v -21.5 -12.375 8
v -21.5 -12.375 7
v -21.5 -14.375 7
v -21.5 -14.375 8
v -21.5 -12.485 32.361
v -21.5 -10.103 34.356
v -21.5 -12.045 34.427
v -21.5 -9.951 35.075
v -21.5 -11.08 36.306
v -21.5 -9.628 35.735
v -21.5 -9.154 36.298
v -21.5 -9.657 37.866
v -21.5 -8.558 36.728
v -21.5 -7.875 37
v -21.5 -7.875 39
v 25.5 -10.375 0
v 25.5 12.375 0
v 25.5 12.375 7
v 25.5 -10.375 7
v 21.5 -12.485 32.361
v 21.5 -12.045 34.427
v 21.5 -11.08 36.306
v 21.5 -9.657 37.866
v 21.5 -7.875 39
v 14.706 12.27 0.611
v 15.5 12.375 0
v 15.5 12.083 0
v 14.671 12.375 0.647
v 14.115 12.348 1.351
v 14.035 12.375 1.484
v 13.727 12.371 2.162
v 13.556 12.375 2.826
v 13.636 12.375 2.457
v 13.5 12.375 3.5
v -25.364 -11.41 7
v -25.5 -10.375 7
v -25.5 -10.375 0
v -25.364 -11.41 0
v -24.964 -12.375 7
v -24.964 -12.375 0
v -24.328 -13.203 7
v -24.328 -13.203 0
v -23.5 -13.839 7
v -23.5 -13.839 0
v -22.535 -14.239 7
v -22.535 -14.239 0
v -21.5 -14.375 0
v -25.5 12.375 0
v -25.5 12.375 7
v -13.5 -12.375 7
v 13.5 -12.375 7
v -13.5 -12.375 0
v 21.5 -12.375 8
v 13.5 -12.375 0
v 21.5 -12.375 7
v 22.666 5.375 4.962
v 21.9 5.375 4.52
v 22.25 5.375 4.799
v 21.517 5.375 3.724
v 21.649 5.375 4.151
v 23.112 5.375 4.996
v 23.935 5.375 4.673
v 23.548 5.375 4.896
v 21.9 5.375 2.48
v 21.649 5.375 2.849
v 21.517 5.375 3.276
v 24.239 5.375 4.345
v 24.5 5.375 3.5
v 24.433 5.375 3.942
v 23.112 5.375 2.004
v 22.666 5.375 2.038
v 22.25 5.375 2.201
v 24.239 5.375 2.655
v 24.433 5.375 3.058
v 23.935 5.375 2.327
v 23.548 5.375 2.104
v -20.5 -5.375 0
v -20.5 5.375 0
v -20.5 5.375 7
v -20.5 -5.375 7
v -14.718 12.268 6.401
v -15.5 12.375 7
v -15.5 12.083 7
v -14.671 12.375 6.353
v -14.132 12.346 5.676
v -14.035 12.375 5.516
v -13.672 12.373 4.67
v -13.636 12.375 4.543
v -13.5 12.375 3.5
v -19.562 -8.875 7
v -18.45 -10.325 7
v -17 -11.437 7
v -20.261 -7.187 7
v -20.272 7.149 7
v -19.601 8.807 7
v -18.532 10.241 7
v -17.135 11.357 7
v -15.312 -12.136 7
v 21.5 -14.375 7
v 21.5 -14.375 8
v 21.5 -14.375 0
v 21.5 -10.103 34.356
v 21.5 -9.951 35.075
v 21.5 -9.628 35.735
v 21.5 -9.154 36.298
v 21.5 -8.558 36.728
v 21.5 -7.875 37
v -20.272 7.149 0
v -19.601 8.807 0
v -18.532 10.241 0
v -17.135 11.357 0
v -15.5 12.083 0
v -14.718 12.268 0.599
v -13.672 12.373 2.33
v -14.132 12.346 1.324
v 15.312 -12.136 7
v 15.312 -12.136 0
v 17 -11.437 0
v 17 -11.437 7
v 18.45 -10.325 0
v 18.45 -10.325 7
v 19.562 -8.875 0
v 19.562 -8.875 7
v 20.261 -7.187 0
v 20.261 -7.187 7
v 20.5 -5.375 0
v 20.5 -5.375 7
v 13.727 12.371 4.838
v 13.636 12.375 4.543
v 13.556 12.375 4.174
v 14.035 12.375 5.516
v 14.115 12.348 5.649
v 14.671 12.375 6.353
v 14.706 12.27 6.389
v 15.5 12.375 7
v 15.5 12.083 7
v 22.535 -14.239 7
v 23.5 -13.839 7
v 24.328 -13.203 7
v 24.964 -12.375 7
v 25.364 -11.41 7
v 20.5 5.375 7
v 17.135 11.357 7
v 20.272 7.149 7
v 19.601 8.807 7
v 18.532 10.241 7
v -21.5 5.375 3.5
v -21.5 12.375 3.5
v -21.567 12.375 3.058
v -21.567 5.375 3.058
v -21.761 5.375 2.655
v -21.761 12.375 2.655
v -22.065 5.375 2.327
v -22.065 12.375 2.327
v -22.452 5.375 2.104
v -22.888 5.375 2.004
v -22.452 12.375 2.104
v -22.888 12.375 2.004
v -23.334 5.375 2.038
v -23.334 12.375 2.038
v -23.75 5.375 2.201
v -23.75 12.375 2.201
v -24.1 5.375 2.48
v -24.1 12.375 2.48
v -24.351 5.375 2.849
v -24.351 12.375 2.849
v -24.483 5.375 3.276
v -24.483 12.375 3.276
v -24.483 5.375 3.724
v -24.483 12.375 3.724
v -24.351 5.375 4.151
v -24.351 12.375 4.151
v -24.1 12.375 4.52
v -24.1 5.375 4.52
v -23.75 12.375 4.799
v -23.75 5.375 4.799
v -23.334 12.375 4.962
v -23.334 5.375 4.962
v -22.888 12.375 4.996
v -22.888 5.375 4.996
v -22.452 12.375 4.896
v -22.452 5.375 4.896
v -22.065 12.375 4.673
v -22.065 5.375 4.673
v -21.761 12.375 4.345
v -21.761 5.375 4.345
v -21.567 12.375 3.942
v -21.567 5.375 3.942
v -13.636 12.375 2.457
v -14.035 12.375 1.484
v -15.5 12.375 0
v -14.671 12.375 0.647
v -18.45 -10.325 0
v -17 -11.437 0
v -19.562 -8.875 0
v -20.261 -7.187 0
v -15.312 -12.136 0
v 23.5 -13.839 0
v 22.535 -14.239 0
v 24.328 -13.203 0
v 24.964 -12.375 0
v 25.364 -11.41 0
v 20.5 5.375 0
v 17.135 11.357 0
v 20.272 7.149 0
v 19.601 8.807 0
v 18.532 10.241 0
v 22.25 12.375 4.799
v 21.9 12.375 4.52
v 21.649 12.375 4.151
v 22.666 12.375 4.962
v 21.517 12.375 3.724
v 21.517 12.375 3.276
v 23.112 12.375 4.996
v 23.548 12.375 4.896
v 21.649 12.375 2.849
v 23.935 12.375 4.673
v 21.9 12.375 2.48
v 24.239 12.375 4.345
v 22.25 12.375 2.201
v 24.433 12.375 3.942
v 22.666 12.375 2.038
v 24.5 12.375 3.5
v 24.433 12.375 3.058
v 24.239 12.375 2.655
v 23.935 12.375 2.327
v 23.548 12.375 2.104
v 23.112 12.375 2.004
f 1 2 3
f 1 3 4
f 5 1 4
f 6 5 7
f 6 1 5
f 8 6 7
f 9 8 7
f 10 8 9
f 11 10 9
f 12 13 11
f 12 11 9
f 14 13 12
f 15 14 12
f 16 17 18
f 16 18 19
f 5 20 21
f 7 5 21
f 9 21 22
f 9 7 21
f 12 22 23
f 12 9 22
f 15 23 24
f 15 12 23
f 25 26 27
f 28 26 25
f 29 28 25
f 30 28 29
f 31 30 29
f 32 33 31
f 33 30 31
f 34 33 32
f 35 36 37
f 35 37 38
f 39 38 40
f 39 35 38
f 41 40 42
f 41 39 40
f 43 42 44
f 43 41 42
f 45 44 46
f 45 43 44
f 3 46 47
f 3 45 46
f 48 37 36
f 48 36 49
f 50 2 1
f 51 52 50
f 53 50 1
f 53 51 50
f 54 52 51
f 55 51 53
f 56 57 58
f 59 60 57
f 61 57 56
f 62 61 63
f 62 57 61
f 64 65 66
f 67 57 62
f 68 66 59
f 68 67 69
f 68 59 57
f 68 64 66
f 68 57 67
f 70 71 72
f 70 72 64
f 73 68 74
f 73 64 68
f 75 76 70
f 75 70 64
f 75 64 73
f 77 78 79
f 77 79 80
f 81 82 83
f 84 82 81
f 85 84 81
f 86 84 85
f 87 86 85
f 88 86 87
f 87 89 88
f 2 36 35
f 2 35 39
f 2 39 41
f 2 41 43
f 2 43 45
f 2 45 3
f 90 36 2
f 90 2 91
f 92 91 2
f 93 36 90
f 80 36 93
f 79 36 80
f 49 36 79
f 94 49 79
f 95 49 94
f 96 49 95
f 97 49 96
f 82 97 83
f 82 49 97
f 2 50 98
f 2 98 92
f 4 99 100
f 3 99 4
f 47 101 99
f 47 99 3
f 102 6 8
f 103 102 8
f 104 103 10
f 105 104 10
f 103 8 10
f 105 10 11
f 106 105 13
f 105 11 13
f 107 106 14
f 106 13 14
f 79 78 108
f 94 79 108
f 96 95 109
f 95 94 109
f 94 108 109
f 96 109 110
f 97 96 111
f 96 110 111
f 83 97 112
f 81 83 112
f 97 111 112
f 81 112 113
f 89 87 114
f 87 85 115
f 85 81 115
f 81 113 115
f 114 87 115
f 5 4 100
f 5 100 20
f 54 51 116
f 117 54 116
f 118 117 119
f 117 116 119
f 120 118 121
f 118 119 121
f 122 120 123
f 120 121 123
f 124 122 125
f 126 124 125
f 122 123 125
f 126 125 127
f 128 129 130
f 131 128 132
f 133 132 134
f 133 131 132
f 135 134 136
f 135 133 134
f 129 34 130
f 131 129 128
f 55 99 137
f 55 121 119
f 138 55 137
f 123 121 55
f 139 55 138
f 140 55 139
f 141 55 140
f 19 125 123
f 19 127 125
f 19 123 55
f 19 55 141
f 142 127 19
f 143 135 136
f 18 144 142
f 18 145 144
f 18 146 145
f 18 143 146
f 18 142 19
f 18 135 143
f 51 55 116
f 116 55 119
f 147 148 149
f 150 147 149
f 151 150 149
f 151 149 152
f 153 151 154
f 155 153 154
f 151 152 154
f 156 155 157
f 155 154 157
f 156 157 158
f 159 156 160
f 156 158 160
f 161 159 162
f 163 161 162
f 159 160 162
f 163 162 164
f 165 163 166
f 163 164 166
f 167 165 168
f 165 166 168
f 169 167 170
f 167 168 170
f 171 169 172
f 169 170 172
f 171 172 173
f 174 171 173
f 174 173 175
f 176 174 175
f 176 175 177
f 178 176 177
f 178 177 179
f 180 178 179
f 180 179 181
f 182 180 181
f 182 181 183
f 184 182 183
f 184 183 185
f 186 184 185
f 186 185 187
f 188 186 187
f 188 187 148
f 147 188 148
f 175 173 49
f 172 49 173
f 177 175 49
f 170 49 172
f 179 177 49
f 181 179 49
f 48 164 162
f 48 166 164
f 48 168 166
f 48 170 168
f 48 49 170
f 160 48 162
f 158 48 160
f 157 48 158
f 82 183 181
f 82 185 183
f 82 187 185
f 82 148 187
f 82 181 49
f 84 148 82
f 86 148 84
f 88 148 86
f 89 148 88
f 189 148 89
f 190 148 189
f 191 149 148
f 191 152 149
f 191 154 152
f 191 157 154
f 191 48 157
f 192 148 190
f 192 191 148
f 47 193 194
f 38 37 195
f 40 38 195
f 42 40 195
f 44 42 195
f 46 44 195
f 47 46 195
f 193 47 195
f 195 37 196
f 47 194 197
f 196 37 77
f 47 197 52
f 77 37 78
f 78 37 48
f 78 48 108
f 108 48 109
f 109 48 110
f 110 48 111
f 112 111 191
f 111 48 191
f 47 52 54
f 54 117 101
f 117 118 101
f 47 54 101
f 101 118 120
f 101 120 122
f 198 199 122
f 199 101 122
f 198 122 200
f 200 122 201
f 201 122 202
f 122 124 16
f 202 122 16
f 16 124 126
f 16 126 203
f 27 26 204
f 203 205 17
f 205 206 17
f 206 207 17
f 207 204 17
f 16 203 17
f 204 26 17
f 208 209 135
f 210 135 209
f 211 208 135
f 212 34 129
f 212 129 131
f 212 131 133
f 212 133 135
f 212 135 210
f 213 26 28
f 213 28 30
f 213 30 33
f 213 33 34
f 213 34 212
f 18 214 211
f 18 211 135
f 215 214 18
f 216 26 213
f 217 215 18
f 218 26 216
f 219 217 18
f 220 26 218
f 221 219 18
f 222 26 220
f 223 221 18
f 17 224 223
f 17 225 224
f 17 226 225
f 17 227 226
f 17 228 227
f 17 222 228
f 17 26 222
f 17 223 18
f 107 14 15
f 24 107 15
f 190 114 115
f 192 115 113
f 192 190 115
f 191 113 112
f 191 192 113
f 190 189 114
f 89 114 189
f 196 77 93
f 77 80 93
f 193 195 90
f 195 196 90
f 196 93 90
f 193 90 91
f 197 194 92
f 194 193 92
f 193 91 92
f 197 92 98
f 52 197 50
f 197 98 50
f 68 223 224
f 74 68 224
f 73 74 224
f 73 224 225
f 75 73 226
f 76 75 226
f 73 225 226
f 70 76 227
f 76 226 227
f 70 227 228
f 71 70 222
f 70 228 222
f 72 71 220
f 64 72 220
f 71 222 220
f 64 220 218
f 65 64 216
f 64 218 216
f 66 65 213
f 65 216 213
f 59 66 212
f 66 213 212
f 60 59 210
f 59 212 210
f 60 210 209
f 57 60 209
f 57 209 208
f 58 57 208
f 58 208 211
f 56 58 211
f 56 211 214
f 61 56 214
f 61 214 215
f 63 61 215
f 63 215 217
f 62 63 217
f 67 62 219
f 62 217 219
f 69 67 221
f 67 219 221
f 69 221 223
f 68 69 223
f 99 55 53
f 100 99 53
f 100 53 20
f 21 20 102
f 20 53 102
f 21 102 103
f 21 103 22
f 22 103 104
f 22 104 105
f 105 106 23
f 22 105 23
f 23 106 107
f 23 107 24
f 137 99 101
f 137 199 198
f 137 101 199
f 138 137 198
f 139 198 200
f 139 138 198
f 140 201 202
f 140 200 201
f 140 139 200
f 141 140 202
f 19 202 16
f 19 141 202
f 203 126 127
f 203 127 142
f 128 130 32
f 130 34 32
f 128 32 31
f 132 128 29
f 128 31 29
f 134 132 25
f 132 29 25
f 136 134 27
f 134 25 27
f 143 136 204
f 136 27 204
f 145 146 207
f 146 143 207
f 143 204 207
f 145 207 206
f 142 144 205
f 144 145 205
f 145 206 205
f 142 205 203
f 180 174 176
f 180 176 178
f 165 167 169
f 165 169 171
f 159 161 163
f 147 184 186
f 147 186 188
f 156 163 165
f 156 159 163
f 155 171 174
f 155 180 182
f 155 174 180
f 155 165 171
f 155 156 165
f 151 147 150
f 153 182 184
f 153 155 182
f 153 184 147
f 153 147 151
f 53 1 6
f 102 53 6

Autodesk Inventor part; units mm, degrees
ref_plane "YZ Plane" through (0, 0, 0) normal (1, 0, 0) x (0, 1, 0)
ref_plane "XZ Plane" through (0, 0, 0) normal (0, 1, 0) x (-1, 0, 0)
ref_plane "XY Plane" through (0, 0, 0) normal (0, 0, 1) x (1, 0, 0)
sketch "Sketch1" plane through (0, 0, 0) normal (0, 0, 1) x (1, 0, 0)
  line L0 (-20.5, -12.375) -> (20.5, -12.375)
  line L1 (20.5, -12.375) -> (20.5, 12.375)
  line L2 (20.5, 12.375) -> (-20.5, 12.375)
  line L3 (-20.5, 12.375) -> (-20.5, -12.375)
  line L4 (-20.5, -12.375) -> (20.5, 12.375) construction
  line L5 (20.5, -12.375) -> (-20.5, 12.375) construction
  line L6 (-20.5, 12.375) -> (-25.5, 12.375) construction
  line L7 (20.5, 12.375) -> (25.5, 12.375) construction
  line L8 (20.5, -12.375) -> (25.5, -12.375) construction
  line L9 (25.5, -12.375) -> (25.5, -14.375) construction
  line L10 (-25.5, 12.375) -> (25.5, 12.375)
  line L11 (25.5, 12.375) -> (25.5, -14.375)
  line L12 (25.5, -14.375) -> (-25.5, -14.375)
  line L13 (-25.5, -14.375) -> (-25.5, 12.375)
  line L14 (-20.5, 12.375) -> (-13.5, 12.375)
  line L15 (20.5, 12.375) -> (13.5, 12.375)
  line L16 (13.5, 12.375) -> (13.5, 5.375) construction
  line L17 (-13.5, 12.375) -> (-13.5, 5.375) construction
  circle A0 centre (-13.5, 5.375) radius 7
  circle A1 centre (13.5, 5.375) radius 7
  point P0 (0, 0)
  point P1 (-20.5, 5.375)
  point P2 (20.5, 12.375)
  point P3 (20.5, 5.375)
  dimension "d0" = 41
  dimension "d3" = 24.75
  dimension "d4" = 5
  dimension "d5" = 5
  dimension "d6" = 5
  dimension "d7" = 2
  dimension "d8" = 7
  dimension "d9" = 7
  dimension "d10" = 7
  dimension "d11" = 7
extrude "Extrusion1" add sketch "Sketch1" along normal blind 7 contours L0 L1 L10 L11 L12 L13 L3 | L3 L2 A0 | A1 L2 L1
fillet "Fillet1" radius 7 2 edges at (-20.5, -12.375, 3.5) (20.5, -12.375, 3.5)
fillet "Fillet2" radius 4 2 edges at (-25.5, -14.375, 3.5) (25.5, -14.375, 3.5)
sketch "Sketch2" plane through (-25.5, 12.375, 0) normal (0, 1, 0) x (1, 0, 0)
  line L0 (0, 0) -> (2.5, 0) construction
  line L1 (12, 0) -> (0, 0) construction
  line L2 (2.5, 0) -> (2.5, -3.5) construction
  line L3 (12, -7) -> (0, -7) construction
  circle A0 centre (2.5, -3.5) radius 1.5
  line L4 (51, 0) -> (51, -7) construction
  line L5 (51, 0) -> (48.5, 0) construction
  line L6 (51, 0) -> (39, 0) construction
  line L7 (48.5, 0) -> (48.5, -3.5) construction
  circle A1 centre (48.5, -3.5) radius 1.5
  point P0 (25.5, 0)
  dimension "d16" = 2.5
  dimension "d17" = 3.5
  dimension "d18" = 3
  dimension "d19" = 2.5
  dimension "d20" = 3.5
  dimension "d21" = 3
extrude "Extrusion2" cut sketch "Sketch2" against normal blind 7
sketch "Sketch3" plane through (0, 0, 7) normal (0, 0, 1) x (1, 0, 0)
  arc A0 (-20.5, -5.375) -> (-13.5, -12.375) centre (-13.5, -5.375) ccw projected
  arc A1 (-25.5, -10.375) -> (-21.5, -14.375) centre (-21.5, -10.375) ccw projected
  line L0 (-13.5, -12.375) -> (-21.5, -12.375)
  line L1 (-21.5, -12.375) -> (-21.5, -14.375)
  line L2 (-21.5, -14.375) -> (-13.5, -14.375)
  line L3 (-13.5, -14.375) -> (-13.5, -12.375)
  line L4 (13.5, -12.375) -> (-13.5, -12.375) projected
  line L5 (-21.5, -14.375) -> (21.5, -14.375) projected
  line L6 (13.5, -12.375) -> (21.5, -12.375)
  line L7 (21.5, -12.375) -> (21.5, -14.375)
  line L8 (21.5, -14.375) -> (13.5, -14.375)
  line L9 (13.5, -14.375) -> (13.5, -12.375)
  line L10 (-13.5, -12.375) -> (13.5, -12.375)
  line L11 (13.5, -12.375) -> (13.5, -14.375)
  line L12 (13.5, -14.375) -> (-13.5, -14.375)
  line L13 (-13.5, -14.375) -> (-13.5, -12.375)
  point P0 (0, 0)
  dimension "d24" = 8
extrude "Extrusion3" add sketch "Sketch3" along normal blind 1
sketch "Sketch7" plane through (-21.5, -14.375, 7) normal (-1, 0, 0) x (0, 0, 1)
  line L0 (1, 0) -> (30, 0) construction
  line L1 (30, 0) -> (30, 4.5) construction
  line L2 (1, 2) -> (30, 4.5)
  line L3 (1, 0) -> (30, 2.25)
  line L4 (30, 4.5) -> (30, 6.5)
  line L5 (30, 6.5) -> (32, 6.5)
  line L6 (32, 6.5) -> (32, 2.4052)
  line L7 (32, 2.4052) -> (30, 2.25)
  line L8 (1, 0) -> (1, 2)
  point P0 (-7, 14.375)
  dimension "d42" = 29
  dimension "d43" = 4.5
  dimension "d44" = 2
  dimension "d45" = 2
extrude "Extrusion6" add sketch "Sketch7" against normal up to surface (43 mm away)
fillet "Fillet3" radius 8 1 edges at (0, -11.9698, 39)
fillet "Fillet4" radius 3 1 edges at (0, -9.875, 37)
sketch "Sketch8" plane through (-25.5, 12.375, 0) normal (0, 1, 0) x (1, 0, 0)
  line L0 (0, 0) -> (0, -7) projected
  line L1 (39, 0) -> (12, 0) projected
  line L2 (0, -7) -> (12, -7)
  line L3 (12, -7) -> (12, 0)
  line L4 (12, 0) -> (0, 0)
  line L5 (0, 0) -> (0, -7)
  line L6 (39, 0) -> (39, -7) projected
  line L7 (51, 0) -> (51, -7) projected
  line L8 (39, 0) -> (51, 0)
  line L9 (51, 0) -> (51, -7)
  line L10 (51, -7) -> (39, -7)
  line L11 (39, -7) -> (39, 0)
  circle A0 centre (48.5, -3.5) radius 1.5 projected
  circle A1 centre (48.5, -3.5) radius 1.5
  circle A2 centre (2.5, -3.5) radius 1.5 projected
  circle A3 centre (2.5, -3.5) radius 1.5
  line L12 (12, -7) -> (10, -7) construction
  line L13 (10, -7) -> (10, 0) construction
  line L14 (39, -7) -> (41, -7) construction
  line L15 (41, -7) -> (41, 0) construction
  arc A4 (10, -7) -> (10, 0) centre (7.9375, -3.5) ccw
  arc A5 (41, 0) -> (41, -7) centre (43.0625, -3.5) ccw
  point P0 (25.5, 0)
  point P1 (39, -3.5)
  point P2 (12, -3.5)
  dimension "d52" = 2
  dimension "d53" = 2
  dimension "d54" = 3
  dimension "d55" = 3
extrude "Extrusion7" cut sketch "Sketch8" against normal blind 1 contours L4 L3 A4 | A4 L3 L2 | L8 A5 L6 | A5 L10 L6
properties part number "SAW_clamp_sled"
